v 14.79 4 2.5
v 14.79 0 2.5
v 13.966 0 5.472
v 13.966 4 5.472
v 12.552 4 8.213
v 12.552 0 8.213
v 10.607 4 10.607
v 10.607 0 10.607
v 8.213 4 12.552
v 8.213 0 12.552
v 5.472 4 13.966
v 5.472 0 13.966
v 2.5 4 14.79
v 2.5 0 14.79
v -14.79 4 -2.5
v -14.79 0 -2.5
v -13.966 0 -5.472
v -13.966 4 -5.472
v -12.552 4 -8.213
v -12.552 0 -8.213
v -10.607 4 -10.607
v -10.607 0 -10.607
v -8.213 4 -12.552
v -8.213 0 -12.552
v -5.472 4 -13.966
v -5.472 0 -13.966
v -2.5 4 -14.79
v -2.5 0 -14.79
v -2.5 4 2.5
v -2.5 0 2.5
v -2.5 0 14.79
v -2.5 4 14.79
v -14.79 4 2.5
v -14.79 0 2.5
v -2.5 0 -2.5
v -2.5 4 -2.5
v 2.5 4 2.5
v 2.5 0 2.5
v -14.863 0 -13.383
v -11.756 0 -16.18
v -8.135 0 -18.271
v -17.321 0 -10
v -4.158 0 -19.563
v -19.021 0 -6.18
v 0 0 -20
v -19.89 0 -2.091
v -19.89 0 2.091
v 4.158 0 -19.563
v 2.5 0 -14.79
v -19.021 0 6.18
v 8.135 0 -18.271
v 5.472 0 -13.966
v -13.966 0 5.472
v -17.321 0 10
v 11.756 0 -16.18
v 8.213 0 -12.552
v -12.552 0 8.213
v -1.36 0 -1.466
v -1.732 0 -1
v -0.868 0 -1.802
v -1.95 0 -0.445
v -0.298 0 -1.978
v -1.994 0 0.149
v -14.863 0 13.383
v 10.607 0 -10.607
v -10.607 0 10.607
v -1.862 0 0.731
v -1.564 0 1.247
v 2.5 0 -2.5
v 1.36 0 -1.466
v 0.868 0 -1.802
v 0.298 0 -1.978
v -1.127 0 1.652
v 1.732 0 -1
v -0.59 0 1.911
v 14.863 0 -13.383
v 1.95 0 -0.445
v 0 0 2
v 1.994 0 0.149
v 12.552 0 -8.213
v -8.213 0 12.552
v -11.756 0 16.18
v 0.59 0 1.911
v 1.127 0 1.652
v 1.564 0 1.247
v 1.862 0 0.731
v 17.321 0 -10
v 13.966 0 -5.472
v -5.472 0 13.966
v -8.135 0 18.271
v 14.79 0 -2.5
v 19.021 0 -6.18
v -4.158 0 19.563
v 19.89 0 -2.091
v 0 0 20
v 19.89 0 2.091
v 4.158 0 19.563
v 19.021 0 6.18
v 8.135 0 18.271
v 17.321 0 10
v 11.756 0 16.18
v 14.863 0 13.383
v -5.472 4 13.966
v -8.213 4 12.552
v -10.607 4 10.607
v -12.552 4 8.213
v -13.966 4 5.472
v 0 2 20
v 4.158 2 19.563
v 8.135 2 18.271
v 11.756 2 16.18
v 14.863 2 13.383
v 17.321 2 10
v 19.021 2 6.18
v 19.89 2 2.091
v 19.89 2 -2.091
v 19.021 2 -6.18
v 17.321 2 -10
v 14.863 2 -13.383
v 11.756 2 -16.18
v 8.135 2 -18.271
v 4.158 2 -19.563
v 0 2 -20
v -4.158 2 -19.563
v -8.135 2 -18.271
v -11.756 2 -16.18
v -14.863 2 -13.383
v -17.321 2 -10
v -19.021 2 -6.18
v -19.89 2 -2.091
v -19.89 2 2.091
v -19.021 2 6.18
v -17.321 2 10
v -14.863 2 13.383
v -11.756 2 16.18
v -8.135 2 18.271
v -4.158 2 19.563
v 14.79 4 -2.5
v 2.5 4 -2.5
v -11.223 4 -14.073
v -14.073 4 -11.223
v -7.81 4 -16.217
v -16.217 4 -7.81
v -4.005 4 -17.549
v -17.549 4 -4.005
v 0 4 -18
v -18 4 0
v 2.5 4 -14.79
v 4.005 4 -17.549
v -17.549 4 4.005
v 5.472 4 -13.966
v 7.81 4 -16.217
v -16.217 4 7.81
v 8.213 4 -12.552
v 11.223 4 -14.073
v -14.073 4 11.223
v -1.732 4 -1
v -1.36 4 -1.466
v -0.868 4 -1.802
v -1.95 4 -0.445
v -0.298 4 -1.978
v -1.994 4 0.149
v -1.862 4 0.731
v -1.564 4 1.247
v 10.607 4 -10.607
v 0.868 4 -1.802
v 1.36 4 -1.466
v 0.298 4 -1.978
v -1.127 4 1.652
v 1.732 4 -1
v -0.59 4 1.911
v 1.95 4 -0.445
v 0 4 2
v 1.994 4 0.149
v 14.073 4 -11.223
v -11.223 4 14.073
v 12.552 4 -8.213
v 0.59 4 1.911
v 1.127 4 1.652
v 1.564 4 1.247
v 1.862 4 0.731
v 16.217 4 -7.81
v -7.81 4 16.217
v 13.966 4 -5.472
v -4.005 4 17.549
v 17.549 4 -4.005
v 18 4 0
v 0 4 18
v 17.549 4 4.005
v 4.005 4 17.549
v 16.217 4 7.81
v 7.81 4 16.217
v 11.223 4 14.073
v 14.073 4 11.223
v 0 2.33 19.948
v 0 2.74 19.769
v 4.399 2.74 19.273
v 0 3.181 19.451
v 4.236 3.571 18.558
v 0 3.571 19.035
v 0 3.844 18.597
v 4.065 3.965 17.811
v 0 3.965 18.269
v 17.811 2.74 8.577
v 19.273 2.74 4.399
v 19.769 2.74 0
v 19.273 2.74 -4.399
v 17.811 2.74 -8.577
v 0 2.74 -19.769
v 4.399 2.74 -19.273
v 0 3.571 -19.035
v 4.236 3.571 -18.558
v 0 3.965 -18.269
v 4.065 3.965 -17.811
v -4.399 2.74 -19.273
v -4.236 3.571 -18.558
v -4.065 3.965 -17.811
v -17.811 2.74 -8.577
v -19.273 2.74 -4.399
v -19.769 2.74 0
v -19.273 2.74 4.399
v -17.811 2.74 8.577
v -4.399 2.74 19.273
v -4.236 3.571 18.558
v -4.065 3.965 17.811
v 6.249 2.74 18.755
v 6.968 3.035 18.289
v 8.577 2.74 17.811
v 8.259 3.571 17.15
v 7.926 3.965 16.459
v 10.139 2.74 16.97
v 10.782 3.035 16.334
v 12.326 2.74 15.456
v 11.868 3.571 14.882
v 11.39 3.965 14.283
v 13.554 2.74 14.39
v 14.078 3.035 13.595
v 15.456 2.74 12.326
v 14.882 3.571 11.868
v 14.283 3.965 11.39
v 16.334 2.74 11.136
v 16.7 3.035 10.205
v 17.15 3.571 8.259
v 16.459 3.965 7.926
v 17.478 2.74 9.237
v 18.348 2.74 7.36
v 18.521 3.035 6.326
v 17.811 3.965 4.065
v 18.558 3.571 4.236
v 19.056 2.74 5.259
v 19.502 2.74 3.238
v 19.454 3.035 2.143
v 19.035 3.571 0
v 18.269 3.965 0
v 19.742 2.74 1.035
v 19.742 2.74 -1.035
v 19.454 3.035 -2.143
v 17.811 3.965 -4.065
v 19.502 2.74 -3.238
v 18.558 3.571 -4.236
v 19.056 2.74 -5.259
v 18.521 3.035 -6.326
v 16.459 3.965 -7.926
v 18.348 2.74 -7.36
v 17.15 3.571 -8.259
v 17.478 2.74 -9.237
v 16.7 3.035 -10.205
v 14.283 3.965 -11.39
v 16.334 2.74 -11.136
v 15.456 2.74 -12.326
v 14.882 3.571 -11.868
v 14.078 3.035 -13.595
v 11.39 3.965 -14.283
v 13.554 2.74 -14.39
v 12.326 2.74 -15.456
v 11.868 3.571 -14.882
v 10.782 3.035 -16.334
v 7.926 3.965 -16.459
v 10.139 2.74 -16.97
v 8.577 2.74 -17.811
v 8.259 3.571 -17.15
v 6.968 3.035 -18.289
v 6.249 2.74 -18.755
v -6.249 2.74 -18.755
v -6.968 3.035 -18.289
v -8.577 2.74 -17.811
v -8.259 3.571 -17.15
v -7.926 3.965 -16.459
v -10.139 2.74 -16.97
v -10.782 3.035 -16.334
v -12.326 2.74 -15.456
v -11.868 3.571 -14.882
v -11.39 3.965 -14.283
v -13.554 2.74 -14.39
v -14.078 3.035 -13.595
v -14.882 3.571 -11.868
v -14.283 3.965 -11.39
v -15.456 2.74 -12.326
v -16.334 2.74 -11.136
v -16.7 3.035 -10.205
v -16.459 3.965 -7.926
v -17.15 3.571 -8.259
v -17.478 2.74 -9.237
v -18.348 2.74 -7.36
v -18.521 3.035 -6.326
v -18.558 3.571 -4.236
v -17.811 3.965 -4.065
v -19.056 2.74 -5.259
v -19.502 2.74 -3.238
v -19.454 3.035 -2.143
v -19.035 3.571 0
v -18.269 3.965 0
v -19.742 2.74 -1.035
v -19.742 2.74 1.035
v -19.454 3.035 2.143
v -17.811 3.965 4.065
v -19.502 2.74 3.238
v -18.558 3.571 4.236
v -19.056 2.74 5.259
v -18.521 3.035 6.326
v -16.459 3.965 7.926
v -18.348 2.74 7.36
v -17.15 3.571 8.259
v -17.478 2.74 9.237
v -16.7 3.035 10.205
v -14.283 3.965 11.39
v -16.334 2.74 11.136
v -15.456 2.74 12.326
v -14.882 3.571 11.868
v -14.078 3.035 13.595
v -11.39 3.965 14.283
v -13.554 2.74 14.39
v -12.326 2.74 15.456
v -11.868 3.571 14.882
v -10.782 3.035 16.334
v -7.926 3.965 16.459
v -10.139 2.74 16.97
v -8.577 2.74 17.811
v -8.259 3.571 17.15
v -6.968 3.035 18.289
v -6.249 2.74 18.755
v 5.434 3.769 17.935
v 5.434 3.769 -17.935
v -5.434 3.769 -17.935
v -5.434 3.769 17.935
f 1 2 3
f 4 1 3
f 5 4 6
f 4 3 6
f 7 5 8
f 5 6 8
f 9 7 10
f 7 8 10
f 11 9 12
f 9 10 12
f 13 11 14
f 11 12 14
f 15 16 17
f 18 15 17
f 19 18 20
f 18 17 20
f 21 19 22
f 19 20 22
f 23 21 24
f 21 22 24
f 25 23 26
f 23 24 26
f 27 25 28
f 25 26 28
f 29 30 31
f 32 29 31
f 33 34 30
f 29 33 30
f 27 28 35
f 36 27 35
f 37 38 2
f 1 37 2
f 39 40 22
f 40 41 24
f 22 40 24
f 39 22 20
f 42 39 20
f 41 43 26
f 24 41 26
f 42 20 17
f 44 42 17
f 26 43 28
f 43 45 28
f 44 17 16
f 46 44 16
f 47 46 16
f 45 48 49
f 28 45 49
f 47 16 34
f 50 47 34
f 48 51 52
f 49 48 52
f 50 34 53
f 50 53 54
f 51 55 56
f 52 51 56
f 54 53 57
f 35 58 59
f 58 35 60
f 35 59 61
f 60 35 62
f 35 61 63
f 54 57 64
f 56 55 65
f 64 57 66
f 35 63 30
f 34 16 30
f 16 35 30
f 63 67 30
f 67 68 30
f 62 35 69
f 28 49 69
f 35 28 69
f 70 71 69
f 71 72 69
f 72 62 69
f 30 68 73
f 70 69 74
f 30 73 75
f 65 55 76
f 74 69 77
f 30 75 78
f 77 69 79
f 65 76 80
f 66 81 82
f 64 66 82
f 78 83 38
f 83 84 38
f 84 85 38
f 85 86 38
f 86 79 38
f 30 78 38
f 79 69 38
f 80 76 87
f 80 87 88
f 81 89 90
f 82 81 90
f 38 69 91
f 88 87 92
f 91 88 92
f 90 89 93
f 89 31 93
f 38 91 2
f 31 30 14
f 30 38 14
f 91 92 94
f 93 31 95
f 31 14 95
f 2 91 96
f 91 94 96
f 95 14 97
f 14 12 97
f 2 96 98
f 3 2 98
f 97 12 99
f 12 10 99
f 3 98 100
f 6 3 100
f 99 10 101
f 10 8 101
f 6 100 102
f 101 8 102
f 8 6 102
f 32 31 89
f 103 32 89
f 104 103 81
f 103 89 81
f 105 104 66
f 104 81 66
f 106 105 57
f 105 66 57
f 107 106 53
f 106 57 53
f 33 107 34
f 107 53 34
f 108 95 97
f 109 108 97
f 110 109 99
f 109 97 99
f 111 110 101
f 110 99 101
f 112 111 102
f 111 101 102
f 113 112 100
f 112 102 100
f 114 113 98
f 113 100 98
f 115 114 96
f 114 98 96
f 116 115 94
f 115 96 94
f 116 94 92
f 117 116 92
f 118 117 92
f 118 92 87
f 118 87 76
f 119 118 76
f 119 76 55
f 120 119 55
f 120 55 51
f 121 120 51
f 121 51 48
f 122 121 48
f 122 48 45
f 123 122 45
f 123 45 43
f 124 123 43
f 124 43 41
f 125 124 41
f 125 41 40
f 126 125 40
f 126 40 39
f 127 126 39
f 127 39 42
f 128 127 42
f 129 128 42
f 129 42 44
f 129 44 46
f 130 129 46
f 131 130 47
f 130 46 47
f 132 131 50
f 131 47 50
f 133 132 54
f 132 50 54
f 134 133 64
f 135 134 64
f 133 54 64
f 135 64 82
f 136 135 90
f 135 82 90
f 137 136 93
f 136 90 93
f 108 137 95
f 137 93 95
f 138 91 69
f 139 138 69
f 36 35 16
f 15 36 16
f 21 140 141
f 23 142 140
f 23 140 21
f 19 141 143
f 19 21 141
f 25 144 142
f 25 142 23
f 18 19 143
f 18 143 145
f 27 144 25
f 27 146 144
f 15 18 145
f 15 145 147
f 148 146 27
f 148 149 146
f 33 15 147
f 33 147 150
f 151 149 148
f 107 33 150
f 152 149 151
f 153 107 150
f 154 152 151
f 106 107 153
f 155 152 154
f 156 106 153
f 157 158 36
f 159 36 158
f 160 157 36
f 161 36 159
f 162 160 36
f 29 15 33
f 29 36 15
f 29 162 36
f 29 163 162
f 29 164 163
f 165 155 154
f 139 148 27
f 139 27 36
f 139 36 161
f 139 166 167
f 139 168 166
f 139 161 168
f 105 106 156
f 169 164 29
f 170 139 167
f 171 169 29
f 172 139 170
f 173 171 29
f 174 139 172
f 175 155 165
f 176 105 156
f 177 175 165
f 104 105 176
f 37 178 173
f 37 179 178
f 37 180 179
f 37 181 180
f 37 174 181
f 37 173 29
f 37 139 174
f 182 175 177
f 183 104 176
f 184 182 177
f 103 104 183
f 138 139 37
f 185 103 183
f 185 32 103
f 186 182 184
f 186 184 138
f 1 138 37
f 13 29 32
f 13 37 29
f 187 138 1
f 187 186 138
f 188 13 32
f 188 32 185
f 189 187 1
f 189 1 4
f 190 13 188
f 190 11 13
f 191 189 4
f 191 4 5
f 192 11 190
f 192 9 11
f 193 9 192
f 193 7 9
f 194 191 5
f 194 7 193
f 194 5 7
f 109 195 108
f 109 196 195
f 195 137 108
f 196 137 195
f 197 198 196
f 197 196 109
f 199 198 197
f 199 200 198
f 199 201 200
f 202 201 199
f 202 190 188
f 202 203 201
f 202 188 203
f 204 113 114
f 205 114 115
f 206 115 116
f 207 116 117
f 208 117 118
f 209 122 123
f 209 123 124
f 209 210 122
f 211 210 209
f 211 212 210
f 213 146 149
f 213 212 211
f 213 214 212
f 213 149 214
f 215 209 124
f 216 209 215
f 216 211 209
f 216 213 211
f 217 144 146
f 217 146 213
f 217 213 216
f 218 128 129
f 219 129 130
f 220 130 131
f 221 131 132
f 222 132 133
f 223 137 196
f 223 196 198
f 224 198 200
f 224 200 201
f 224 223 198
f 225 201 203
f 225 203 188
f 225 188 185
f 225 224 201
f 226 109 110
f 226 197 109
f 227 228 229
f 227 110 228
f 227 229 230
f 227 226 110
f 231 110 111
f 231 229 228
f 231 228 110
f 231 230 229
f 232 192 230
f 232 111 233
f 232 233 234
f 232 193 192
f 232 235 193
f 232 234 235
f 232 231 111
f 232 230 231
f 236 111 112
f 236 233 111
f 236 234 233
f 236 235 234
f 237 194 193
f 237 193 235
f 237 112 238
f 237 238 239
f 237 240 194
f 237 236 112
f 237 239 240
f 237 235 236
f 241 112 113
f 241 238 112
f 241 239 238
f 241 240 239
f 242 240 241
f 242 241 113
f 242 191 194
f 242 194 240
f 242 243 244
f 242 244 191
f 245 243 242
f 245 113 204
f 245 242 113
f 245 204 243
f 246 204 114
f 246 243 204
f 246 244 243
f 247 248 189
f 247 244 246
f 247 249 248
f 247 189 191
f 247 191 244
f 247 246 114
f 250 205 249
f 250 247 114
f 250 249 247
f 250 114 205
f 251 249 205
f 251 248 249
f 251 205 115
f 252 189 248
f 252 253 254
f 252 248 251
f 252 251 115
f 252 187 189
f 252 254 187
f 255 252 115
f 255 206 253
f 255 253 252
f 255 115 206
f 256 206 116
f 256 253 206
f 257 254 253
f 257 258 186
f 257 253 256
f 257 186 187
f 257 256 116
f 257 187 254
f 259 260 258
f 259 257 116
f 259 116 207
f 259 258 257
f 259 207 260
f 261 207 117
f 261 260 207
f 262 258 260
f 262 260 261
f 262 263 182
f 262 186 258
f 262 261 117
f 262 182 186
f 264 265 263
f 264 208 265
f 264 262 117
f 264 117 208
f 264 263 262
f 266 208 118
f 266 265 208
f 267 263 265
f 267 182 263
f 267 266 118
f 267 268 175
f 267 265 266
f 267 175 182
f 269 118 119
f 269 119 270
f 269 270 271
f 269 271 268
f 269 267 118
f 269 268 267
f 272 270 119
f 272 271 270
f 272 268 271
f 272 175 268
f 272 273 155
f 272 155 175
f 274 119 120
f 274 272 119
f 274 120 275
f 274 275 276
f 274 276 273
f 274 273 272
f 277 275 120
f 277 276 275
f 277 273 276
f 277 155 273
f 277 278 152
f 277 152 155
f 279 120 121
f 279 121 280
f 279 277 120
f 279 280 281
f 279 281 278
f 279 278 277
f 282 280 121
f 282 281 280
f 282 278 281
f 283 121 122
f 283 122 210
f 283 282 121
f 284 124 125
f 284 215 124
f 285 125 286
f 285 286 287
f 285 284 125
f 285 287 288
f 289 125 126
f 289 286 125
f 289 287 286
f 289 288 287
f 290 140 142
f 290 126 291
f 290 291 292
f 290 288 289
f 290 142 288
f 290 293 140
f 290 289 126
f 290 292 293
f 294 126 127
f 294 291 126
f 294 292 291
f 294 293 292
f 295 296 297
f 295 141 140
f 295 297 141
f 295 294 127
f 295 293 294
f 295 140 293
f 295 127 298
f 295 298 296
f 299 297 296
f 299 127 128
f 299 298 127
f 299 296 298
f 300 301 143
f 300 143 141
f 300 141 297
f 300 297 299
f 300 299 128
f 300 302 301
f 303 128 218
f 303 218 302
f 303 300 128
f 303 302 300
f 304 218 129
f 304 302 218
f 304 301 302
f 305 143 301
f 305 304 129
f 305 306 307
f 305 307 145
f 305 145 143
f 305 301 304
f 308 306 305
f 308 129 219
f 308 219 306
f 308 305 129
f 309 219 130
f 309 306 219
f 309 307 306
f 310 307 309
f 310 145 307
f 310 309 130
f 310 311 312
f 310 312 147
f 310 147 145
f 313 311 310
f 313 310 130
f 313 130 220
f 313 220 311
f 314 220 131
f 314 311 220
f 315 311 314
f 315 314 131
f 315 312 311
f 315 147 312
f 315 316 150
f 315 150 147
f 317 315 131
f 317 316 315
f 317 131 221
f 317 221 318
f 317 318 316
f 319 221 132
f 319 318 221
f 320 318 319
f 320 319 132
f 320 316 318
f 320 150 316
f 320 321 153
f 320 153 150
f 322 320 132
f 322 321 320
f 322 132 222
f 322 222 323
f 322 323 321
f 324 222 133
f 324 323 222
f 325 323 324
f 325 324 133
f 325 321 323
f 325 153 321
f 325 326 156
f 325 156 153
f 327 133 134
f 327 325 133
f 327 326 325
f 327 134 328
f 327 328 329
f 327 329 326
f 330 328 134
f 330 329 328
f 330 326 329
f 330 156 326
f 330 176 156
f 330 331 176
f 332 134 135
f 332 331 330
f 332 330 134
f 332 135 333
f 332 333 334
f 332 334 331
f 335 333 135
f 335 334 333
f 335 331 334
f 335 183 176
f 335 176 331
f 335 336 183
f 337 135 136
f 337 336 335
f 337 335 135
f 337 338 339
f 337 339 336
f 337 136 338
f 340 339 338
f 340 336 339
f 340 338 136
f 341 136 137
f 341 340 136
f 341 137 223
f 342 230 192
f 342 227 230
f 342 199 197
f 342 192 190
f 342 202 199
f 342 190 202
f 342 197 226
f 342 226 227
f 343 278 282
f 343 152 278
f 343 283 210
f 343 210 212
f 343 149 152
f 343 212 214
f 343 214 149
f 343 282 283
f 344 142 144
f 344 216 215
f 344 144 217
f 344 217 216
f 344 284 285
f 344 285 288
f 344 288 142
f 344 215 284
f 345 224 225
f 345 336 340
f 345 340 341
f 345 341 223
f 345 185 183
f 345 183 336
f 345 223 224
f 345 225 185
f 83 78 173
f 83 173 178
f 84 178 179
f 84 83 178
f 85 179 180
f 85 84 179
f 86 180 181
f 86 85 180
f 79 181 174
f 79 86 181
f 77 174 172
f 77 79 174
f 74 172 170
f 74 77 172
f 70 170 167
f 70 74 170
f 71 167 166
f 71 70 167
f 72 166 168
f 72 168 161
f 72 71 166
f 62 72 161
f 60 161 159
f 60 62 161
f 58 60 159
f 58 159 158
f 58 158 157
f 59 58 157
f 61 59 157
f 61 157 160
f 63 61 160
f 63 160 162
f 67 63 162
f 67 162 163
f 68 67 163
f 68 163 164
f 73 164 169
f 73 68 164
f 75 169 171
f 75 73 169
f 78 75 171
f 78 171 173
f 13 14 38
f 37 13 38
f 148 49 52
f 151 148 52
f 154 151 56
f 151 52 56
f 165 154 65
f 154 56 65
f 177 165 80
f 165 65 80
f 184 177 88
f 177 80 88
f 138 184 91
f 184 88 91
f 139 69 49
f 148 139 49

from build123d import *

# Parameters (mm, degrees)
SKETCH2_R           = 20
SKETCH2_R_2         = 2
BOSS_EXTRUDE1_DEPTH = 4
FILLET2_SIZE        = 2


with BuildPart() as part:
    # Sketch2 → Boss-Extrude1 (new body)
    with BuildSketch(Plane(origin=(0, 0, 0), x_dir=(1, 0, 0), z_dir=(0, 1, 0))):
        with Locations(Location((0, 0, 0), (0, 0, 270))):
            Circle(SKETCH2_R)
        with BuildLine():
            Line((-2.5, 14.790199458), (-2.5, 2.5))
            Line((-2.5, 2.5), (-14.790199458, 2.5))
            ThreePointArc((-14.790199458, 2.5), (-10.606601718, 10.606601718), (-2.5, 14.790199458))
        make_face(mode=Mode.SUBTRACT)
        with BuildLine():
            Line((-14.790199458, -2.5), (-2.5, -2.5))
            Line((-2.5, -2.5), (-2.5, -14.790199458))
            ThreePointArc((-2.5, -14.790199458), (-10.606601718, -10.606601718), (-14.790199458, -2.5))
        make_face(mode=Mode.SUBTRACT)
        with BuildLine():
            Line((2.5, -14.790199458), (2.5, -2.5))
            Line((2.5, -2.5), (14.790199458, -2.5))
            ThreePointArc((14.790199458, -2.5), (10.606601718, -10.606601718), (2.5, -14.790199458))
        make_face(mode=Mode.SUBTRACT)
        with BuildLine():
            Line((14.790199458, 2.5), (2.5, 2.5))
            Line((2.5, 2.5), (2.5, 14.790199458))
            ThreePointArc((2.5, 14.790199458), (10.606601718, 10.606601718), (14.790199458, 2.5))
        make_face(mode=Mode.SUBTRACT)
        with Locations(Location((0, 0, 0), (0, 0, 270))):
            Circle(SKETCH2_R_2, mode=Mode.SUBTRACT)
    extrude(amount=BOSS_EXTRUDE1_DEPTH)

    # Fillet2
    # a fillet whose section is not a circle: 2 mm, written as the material it takes off along each edge
    with BuildSketch(Plane(origin=(0, 4, 0), x_dir=(0, 0, 1), z_dir=(-1, 0, 0))) as fillet2_piece_1:
        with BuildLine():
            Bezier((20, -FILLET2_SIZE), (20, 0), (20 - FILLET2_SIZE, 0), weights=[1, 0.471404521, 1])
            Line((20 - FILLET2_SIZE, 0), (20, 0))
            Line((20, 0), (20, -FILLET2_SIZE))
        make_face()
    revolve(axis=Axis((0, 4, 0), (0, 1, 0)), mode=Mode.SUBTRACT)


solid = part.part
